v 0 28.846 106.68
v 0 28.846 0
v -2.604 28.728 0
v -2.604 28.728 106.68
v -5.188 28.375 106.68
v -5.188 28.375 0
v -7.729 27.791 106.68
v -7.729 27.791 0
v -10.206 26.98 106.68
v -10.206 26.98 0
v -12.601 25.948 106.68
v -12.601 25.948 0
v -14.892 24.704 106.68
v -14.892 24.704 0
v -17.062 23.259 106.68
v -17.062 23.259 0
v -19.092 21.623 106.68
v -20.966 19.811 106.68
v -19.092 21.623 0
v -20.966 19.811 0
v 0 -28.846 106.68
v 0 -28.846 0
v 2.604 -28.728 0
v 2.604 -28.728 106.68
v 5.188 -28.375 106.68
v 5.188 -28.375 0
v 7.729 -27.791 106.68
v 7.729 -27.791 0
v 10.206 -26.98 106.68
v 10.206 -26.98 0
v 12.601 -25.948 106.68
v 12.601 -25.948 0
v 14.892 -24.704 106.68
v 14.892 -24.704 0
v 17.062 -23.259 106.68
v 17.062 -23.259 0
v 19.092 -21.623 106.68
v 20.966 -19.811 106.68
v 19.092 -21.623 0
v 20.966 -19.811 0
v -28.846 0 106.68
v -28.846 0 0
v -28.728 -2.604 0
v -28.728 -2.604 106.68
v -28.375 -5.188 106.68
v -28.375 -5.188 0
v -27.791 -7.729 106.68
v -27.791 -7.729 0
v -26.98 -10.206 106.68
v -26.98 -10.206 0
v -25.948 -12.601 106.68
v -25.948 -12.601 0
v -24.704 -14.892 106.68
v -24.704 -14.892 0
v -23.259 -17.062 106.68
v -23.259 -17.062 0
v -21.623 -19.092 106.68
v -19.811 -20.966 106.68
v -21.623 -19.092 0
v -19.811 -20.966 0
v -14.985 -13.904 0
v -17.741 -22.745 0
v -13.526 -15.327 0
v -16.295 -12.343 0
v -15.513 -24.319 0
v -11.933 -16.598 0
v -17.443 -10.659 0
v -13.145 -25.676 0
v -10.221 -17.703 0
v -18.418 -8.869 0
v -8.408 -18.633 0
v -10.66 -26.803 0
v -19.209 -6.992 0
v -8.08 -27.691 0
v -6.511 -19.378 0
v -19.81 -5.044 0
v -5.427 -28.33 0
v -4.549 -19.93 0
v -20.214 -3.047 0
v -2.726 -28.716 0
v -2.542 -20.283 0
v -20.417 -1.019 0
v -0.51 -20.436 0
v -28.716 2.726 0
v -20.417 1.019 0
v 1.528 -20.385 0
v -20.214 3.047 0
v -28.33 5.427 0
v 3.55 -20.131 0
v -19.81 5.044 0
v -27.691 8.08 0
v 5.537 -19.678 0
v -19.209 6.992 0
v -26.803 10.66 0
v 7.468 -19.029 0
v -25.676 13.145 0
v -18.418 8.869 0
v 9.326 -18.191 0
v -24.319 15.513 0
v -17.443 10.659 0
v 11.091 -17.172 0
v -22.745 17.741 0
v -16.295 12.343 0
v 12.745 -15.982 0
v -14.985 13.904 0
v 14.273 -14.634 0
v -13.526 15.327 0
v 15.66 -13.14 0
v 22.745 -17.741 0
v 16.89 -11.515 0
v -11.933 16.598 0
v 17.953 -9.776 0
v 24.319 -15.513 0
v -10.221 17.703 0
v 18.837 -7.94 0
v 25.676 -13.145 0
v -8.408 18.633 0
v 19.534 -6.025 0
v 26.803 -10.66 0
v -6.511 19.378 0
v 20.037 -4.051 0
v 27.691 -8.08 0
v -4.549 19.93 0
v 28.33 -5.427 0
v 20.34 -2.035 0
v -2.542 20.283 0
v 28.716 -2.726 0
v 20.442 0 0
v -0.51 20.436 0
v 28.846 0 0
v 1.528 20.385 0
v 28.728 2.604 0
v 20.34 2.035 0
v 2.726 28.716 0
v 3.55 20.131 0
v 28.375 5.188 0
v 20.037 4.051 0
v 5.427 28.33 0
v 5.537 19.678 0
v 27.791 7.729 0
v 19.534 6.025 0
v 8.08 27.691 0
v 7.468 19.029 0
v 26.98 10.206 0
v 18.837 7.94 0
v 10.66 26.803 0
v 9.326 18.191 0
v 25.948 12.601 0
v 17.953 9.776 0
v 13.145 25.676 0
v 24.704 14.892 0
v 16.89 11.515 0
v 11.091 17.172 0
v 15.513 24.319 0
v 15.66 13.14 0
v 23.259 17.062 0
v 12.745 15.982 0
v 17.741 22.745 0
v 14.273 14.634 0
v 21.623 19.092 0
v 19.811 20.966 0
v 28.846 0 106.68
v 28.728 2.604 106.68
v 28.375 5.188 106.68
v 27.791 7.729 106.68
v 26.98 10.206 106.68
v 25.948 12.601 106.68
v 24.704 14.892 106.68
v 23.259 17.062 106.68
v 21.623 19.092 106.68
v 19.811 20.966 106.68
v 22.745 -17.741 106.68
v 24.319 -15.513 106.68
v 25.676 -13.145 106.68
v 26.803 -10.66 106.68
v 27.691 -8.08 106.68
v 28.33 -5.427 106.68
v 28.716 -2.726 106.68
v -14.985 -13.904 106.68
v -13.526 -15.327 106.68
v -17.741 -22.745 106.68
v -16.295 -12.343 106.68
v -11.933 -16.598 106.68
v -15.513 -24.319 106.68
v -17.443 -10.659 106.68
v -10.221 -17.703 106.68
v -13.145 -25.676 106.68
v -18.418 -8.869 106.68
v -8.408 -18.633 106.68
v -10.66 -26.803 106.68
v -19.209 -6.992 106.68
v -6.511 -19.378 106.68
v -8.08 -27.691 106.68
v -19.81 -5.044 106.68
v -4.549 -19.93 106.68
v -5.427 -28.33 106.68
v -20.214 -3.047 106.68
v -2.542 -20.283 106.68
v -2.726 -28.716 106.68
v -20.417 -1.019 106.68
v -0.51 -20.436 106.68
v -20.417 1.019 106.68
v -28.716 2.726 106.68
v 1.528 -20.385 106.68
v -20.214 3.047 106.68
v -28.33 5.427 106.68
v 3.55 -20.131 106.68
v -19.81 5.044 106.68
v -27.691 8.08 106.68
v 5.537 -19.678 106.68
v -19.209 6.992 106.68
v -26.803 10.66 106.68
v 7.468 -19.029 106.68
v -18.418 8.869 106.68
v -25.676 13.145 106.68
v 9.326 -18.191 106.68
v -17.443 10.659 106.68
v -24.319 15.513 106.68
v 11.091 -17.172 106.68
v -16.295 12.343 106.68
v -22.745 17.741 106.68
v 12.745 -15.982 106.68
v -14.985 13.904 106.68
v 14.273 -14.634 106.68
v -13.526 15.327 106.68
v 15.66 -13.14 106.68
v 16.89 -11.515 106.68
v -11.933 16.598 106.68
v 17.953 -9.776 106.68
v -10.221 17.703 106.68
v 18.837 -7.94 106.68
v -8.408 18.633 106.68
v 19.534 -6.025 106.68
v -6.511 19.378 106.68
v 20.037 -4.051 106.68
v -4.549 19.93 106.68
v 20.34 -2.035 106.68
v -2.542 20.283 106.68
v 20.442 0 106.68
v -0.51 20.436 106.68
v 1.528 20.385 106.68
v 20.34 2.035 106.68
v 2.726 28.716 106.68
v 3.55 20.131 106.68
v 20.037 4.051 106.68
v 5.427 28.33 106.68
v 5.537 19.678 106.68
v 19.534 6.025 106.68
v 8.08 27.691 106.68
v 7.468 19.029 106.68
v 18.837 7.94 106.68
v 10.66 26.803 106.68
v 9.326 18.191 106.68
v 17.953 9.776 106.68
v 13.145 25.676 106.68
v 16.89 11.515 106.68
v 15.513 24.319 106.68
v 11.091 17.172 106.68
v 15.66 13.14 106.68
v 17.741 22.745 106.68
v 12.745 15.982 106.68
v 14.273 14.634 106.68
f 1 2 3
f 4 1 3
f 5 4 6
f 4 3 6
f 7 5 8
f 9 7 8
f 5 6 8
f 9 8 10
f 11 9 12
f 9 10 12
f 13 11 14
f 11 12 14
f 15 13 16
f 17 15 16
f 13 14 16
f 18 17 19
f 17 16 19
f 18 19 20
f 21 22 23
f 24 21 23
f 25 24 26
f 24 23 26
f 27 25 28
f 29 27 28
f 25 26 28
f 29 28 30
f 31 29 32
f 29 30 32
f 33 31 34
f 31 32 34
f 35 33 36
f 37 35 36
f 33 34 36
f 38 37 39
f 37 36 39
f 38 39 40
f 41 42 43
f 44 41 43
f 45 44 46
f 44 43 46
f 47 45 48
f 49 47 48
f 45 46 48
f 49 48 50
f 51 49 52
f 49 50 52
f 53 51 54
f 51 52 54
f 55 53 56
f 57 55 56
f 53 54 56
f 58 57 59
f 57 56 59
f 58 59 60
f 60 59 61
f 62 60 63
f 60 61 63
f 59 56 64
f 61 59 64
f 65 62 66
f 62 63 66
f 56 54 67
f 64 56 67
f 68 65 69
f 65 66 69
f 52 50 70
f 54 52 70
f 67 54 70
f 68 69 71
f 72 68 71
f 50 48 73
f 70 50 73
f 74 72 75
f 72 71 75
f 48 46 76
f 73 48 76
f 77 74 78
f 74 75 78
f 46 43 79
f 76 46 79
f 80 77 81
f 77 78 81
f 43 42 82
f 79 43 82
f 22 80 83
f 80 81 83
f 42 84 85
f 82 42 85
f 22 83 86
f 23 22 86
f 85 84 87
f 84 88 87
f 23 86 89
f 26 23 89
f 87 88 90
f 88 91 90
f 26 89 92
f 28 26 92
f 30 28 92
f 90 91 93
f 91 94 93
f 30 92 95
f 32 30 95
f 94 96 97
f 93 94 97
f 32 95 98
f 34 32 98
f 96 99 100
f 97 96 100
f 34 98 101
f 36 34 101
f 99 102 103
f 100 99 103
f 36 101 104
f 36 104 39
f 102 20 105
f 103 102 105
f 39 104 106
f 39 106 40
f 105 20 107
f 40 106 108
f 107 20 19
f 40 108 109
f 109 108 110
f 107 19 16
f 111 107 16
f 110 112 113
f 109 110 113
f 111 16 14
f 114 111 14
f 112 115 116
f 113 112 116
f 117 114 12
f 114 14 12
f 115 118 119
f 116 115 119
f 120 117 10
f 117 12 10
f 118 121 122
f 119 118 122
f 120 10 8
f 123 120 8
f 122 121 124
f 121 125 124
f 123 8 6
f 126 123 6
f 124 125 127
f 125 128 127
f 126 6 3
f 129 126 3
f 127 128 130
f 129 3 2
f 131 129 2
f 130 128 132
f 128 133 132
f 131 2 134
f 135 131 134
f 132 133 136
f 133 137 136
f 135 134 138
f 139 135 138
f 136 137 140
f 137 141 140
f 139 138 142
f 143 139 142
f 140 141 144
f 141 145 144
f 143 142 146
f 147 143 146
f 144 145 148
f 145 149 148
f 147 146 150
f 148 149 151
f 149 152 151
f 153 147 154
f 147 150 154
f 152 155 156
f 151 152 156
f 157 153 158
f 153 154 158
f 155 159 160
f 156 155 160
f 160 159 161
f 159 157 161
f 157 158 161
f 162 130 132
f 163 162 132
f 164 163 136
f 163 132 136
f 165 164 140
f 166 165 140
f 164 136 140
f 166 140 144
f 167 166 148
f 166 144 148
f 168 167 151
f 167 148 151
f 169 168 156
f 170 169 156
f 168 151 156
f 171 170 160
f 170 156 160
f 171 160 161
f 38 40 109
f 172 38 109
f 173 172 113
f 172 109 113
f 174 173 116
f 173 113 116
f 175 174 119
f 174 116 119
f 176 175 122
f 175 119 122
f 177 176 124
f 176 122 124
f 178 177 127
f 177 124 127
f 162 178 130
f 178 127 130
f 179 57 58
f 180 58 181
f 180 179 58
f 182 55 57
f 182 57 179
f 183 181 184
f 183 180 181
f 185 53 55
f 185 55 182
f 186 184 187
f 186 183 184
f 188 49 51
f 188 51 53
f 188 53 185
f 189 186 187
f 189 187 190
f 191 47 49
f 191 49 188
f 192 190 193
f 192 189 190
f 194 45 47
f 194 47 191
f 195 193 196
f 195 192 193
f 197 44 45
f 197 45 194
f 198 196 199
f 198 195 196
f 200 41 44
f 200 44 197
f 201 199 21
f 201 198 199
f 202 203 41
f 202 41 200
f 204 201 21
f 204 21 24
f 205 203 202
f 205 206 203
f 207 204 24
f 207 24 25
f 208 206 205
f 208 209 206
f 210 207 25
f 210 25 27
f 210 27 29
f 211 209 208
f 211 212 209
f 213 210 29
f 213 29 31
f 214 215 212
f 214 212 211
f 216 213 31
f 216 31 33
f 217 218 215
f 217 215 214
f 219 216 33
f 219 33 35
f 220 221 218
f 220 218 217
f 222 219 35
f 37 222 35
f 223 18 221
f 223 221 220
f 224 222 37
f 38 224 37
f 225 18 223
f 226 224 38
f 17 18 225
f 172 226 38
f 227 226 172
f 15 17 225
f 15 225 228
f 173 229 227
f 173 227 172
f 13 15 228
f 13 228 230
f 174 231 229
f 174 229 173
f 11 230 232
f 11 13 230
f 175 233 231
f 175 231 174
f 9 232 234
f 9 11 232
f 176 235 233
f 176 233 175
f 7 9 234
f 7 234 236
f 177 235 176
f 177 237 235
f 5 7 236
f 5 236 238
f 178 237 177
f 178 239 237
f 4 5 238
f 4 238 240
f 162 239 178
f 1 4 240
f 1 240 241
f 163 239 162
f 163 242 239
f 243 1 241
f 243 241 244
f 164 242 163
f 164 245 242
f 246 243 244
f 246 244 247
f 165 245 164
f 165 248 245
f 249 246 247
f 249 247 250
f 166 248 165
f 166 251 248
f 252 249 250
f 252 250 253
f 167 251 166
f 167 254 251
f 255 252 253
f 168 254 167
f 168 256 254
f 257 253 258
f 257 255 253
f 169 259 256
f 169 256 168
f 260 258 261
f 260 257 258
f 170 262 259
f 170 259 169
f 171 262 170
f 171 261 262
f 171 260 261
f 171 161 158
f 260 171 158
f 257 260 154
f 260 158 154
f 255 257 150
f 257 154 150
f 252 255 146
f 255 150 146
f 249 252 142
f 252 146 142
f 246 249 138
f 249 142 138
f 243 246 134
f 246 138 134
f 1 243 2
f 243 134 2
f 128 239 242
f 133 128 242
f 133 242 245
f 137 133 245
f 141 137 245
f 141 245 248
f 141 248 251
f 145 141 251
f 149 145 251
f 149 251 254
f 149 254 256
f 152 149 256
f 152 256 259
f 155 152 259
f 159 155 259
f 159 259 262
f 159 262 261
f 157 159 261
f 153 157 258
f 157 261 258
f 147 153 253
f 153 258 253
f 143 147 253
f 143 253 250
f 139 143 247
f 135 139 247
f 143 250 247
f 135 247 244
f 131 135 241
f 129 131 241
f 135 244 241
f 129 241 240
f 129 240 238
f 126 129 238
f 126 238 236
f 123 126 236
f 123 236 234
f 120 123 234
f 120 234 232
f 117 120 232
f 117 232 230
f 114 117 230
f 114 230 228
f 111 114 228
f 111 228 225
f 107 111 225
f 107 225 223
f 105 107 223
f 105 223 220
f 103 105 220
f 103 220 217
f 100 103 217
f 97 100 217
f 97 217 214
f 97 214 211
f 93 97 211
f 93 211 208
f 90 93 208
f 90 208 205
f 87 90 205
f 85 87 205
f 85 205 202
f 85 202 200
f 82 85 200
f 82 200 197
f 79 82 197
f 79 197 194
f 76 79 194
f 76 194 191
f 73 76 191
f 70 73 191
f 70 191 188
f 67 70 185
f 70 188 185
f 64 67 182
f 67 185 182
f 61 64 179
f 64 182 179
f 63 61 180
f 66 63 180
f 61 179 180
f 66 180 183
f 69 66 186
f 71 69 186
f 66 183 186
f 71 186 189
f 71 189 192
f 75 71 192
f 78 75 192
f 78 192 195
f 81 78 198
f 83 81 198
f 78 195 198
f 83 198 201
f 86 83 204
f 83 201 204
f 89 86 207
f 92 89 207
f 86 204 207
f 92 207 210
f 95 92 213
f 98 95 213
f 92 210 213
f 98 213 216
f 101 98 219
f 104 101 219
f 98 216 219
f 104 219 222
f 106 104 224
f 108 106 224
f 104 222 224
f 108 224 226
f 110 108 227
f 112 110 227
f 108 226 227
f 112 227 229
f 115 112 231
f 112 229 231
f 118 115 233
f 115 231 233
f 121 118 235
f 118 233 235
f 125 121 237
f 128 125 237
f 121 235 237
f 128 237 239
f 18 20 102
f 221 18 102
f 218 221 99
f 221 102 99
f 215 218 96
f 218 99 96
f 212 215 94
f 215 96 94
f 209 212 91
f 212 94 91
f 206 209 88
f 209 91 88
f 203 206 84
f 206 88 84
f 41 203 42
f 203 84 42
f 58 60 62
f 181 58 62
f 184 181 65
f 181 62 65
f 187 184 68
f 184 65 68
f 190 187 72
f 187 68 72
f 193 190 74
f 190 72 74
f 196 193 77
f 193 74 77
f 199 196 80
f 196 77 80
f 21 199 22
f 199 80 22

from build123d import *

# Parameters (mm, degrees)
F1_DEPTH = 106.68
F2_R     = 20.442047
F3_DEPTH = 151.13


with BuildPart() as f1:
    # F0 (on Top) → F1 (new body)
    with BuildSketch(Plane.XY):
        with BuildLine():
            Line((0, 0), (28.845539, 0))
            ThreePointArc((28.845539, 0), (26.490793, 11.415035), (19.811004, 20.966383))
            Line((19.811004, 20.966383), (0, 0))
        make_face()
        with BuildLine():
            ThreePointArc((20.966383, -19.811004), (26.803468, -10.660171), (28.845539, 0))
            Line((28.845539, 0), (0, 0))
            Line((0, 0), (20.966383, -19.811004))
        make_face()
        with BuildLine():
            Line((0, 0), (19.811004, 20.966383))
            ThreePointArc((19.811004, 20.966383), (10.660171, 26.803468), (0, 28.845539))
            Line((0, 28.845539), (0, 0))
        make_face()
        with BuildLine():
            ThreePointArc((0, -28.845539), (11.415035, -26.490793), (20.966383, -19.811004))
            Line((20.966383, -19.811004), (0, 0))
            Line((0, 0), (0, -28.845539))
        make_face()
        with BuildLine():
            Line((-19.811004, -20.966383), (0, 0))
            Line((0, 0), (-28.845539, 0))
            ThreePointArc((-28.845539, 0), (-26.490793, -11.415035), (-19.811004, -20.966383))
        make_face()
        with BuildLine():
            Line((-20.966383, 19.811004), (0, 0))
            Line((0, 0), (0, 28.845539))
            ThreePointArc((0, 28.845539), (-11.415035, 26.490793), (-20.966383, 19.811004))
        make_face()
        with BuildLine():
            Line((-28.845539, 0), (0, 0))
            Line((0, 0), (-20.966383, 19.811004))
            ThreePointArc((-20.966383, 19.811004), (-26.803468, 10.660171), (-28.845539, 0))
        make_face()
        with BuildLine():
            Line((0, -28.845539), (0, 0))
            Line((0, 0), (-19.811004, -20.966383))
            ThreePointArc((-19.811004, -20.966383), (-10.660171, -26.803468), (0, -28.845539))
        make_face()
    extrude(amount=F1_DEPTH)

    # F2 (on face) → F3 (cut)
    with BuildSketch(Plane.XY.offset(106.68)):
        Circle(F2_R)
    extrude(amount=-F3_DEPTH, mode=Mode.SUBTRACT)


solid = f1.part
